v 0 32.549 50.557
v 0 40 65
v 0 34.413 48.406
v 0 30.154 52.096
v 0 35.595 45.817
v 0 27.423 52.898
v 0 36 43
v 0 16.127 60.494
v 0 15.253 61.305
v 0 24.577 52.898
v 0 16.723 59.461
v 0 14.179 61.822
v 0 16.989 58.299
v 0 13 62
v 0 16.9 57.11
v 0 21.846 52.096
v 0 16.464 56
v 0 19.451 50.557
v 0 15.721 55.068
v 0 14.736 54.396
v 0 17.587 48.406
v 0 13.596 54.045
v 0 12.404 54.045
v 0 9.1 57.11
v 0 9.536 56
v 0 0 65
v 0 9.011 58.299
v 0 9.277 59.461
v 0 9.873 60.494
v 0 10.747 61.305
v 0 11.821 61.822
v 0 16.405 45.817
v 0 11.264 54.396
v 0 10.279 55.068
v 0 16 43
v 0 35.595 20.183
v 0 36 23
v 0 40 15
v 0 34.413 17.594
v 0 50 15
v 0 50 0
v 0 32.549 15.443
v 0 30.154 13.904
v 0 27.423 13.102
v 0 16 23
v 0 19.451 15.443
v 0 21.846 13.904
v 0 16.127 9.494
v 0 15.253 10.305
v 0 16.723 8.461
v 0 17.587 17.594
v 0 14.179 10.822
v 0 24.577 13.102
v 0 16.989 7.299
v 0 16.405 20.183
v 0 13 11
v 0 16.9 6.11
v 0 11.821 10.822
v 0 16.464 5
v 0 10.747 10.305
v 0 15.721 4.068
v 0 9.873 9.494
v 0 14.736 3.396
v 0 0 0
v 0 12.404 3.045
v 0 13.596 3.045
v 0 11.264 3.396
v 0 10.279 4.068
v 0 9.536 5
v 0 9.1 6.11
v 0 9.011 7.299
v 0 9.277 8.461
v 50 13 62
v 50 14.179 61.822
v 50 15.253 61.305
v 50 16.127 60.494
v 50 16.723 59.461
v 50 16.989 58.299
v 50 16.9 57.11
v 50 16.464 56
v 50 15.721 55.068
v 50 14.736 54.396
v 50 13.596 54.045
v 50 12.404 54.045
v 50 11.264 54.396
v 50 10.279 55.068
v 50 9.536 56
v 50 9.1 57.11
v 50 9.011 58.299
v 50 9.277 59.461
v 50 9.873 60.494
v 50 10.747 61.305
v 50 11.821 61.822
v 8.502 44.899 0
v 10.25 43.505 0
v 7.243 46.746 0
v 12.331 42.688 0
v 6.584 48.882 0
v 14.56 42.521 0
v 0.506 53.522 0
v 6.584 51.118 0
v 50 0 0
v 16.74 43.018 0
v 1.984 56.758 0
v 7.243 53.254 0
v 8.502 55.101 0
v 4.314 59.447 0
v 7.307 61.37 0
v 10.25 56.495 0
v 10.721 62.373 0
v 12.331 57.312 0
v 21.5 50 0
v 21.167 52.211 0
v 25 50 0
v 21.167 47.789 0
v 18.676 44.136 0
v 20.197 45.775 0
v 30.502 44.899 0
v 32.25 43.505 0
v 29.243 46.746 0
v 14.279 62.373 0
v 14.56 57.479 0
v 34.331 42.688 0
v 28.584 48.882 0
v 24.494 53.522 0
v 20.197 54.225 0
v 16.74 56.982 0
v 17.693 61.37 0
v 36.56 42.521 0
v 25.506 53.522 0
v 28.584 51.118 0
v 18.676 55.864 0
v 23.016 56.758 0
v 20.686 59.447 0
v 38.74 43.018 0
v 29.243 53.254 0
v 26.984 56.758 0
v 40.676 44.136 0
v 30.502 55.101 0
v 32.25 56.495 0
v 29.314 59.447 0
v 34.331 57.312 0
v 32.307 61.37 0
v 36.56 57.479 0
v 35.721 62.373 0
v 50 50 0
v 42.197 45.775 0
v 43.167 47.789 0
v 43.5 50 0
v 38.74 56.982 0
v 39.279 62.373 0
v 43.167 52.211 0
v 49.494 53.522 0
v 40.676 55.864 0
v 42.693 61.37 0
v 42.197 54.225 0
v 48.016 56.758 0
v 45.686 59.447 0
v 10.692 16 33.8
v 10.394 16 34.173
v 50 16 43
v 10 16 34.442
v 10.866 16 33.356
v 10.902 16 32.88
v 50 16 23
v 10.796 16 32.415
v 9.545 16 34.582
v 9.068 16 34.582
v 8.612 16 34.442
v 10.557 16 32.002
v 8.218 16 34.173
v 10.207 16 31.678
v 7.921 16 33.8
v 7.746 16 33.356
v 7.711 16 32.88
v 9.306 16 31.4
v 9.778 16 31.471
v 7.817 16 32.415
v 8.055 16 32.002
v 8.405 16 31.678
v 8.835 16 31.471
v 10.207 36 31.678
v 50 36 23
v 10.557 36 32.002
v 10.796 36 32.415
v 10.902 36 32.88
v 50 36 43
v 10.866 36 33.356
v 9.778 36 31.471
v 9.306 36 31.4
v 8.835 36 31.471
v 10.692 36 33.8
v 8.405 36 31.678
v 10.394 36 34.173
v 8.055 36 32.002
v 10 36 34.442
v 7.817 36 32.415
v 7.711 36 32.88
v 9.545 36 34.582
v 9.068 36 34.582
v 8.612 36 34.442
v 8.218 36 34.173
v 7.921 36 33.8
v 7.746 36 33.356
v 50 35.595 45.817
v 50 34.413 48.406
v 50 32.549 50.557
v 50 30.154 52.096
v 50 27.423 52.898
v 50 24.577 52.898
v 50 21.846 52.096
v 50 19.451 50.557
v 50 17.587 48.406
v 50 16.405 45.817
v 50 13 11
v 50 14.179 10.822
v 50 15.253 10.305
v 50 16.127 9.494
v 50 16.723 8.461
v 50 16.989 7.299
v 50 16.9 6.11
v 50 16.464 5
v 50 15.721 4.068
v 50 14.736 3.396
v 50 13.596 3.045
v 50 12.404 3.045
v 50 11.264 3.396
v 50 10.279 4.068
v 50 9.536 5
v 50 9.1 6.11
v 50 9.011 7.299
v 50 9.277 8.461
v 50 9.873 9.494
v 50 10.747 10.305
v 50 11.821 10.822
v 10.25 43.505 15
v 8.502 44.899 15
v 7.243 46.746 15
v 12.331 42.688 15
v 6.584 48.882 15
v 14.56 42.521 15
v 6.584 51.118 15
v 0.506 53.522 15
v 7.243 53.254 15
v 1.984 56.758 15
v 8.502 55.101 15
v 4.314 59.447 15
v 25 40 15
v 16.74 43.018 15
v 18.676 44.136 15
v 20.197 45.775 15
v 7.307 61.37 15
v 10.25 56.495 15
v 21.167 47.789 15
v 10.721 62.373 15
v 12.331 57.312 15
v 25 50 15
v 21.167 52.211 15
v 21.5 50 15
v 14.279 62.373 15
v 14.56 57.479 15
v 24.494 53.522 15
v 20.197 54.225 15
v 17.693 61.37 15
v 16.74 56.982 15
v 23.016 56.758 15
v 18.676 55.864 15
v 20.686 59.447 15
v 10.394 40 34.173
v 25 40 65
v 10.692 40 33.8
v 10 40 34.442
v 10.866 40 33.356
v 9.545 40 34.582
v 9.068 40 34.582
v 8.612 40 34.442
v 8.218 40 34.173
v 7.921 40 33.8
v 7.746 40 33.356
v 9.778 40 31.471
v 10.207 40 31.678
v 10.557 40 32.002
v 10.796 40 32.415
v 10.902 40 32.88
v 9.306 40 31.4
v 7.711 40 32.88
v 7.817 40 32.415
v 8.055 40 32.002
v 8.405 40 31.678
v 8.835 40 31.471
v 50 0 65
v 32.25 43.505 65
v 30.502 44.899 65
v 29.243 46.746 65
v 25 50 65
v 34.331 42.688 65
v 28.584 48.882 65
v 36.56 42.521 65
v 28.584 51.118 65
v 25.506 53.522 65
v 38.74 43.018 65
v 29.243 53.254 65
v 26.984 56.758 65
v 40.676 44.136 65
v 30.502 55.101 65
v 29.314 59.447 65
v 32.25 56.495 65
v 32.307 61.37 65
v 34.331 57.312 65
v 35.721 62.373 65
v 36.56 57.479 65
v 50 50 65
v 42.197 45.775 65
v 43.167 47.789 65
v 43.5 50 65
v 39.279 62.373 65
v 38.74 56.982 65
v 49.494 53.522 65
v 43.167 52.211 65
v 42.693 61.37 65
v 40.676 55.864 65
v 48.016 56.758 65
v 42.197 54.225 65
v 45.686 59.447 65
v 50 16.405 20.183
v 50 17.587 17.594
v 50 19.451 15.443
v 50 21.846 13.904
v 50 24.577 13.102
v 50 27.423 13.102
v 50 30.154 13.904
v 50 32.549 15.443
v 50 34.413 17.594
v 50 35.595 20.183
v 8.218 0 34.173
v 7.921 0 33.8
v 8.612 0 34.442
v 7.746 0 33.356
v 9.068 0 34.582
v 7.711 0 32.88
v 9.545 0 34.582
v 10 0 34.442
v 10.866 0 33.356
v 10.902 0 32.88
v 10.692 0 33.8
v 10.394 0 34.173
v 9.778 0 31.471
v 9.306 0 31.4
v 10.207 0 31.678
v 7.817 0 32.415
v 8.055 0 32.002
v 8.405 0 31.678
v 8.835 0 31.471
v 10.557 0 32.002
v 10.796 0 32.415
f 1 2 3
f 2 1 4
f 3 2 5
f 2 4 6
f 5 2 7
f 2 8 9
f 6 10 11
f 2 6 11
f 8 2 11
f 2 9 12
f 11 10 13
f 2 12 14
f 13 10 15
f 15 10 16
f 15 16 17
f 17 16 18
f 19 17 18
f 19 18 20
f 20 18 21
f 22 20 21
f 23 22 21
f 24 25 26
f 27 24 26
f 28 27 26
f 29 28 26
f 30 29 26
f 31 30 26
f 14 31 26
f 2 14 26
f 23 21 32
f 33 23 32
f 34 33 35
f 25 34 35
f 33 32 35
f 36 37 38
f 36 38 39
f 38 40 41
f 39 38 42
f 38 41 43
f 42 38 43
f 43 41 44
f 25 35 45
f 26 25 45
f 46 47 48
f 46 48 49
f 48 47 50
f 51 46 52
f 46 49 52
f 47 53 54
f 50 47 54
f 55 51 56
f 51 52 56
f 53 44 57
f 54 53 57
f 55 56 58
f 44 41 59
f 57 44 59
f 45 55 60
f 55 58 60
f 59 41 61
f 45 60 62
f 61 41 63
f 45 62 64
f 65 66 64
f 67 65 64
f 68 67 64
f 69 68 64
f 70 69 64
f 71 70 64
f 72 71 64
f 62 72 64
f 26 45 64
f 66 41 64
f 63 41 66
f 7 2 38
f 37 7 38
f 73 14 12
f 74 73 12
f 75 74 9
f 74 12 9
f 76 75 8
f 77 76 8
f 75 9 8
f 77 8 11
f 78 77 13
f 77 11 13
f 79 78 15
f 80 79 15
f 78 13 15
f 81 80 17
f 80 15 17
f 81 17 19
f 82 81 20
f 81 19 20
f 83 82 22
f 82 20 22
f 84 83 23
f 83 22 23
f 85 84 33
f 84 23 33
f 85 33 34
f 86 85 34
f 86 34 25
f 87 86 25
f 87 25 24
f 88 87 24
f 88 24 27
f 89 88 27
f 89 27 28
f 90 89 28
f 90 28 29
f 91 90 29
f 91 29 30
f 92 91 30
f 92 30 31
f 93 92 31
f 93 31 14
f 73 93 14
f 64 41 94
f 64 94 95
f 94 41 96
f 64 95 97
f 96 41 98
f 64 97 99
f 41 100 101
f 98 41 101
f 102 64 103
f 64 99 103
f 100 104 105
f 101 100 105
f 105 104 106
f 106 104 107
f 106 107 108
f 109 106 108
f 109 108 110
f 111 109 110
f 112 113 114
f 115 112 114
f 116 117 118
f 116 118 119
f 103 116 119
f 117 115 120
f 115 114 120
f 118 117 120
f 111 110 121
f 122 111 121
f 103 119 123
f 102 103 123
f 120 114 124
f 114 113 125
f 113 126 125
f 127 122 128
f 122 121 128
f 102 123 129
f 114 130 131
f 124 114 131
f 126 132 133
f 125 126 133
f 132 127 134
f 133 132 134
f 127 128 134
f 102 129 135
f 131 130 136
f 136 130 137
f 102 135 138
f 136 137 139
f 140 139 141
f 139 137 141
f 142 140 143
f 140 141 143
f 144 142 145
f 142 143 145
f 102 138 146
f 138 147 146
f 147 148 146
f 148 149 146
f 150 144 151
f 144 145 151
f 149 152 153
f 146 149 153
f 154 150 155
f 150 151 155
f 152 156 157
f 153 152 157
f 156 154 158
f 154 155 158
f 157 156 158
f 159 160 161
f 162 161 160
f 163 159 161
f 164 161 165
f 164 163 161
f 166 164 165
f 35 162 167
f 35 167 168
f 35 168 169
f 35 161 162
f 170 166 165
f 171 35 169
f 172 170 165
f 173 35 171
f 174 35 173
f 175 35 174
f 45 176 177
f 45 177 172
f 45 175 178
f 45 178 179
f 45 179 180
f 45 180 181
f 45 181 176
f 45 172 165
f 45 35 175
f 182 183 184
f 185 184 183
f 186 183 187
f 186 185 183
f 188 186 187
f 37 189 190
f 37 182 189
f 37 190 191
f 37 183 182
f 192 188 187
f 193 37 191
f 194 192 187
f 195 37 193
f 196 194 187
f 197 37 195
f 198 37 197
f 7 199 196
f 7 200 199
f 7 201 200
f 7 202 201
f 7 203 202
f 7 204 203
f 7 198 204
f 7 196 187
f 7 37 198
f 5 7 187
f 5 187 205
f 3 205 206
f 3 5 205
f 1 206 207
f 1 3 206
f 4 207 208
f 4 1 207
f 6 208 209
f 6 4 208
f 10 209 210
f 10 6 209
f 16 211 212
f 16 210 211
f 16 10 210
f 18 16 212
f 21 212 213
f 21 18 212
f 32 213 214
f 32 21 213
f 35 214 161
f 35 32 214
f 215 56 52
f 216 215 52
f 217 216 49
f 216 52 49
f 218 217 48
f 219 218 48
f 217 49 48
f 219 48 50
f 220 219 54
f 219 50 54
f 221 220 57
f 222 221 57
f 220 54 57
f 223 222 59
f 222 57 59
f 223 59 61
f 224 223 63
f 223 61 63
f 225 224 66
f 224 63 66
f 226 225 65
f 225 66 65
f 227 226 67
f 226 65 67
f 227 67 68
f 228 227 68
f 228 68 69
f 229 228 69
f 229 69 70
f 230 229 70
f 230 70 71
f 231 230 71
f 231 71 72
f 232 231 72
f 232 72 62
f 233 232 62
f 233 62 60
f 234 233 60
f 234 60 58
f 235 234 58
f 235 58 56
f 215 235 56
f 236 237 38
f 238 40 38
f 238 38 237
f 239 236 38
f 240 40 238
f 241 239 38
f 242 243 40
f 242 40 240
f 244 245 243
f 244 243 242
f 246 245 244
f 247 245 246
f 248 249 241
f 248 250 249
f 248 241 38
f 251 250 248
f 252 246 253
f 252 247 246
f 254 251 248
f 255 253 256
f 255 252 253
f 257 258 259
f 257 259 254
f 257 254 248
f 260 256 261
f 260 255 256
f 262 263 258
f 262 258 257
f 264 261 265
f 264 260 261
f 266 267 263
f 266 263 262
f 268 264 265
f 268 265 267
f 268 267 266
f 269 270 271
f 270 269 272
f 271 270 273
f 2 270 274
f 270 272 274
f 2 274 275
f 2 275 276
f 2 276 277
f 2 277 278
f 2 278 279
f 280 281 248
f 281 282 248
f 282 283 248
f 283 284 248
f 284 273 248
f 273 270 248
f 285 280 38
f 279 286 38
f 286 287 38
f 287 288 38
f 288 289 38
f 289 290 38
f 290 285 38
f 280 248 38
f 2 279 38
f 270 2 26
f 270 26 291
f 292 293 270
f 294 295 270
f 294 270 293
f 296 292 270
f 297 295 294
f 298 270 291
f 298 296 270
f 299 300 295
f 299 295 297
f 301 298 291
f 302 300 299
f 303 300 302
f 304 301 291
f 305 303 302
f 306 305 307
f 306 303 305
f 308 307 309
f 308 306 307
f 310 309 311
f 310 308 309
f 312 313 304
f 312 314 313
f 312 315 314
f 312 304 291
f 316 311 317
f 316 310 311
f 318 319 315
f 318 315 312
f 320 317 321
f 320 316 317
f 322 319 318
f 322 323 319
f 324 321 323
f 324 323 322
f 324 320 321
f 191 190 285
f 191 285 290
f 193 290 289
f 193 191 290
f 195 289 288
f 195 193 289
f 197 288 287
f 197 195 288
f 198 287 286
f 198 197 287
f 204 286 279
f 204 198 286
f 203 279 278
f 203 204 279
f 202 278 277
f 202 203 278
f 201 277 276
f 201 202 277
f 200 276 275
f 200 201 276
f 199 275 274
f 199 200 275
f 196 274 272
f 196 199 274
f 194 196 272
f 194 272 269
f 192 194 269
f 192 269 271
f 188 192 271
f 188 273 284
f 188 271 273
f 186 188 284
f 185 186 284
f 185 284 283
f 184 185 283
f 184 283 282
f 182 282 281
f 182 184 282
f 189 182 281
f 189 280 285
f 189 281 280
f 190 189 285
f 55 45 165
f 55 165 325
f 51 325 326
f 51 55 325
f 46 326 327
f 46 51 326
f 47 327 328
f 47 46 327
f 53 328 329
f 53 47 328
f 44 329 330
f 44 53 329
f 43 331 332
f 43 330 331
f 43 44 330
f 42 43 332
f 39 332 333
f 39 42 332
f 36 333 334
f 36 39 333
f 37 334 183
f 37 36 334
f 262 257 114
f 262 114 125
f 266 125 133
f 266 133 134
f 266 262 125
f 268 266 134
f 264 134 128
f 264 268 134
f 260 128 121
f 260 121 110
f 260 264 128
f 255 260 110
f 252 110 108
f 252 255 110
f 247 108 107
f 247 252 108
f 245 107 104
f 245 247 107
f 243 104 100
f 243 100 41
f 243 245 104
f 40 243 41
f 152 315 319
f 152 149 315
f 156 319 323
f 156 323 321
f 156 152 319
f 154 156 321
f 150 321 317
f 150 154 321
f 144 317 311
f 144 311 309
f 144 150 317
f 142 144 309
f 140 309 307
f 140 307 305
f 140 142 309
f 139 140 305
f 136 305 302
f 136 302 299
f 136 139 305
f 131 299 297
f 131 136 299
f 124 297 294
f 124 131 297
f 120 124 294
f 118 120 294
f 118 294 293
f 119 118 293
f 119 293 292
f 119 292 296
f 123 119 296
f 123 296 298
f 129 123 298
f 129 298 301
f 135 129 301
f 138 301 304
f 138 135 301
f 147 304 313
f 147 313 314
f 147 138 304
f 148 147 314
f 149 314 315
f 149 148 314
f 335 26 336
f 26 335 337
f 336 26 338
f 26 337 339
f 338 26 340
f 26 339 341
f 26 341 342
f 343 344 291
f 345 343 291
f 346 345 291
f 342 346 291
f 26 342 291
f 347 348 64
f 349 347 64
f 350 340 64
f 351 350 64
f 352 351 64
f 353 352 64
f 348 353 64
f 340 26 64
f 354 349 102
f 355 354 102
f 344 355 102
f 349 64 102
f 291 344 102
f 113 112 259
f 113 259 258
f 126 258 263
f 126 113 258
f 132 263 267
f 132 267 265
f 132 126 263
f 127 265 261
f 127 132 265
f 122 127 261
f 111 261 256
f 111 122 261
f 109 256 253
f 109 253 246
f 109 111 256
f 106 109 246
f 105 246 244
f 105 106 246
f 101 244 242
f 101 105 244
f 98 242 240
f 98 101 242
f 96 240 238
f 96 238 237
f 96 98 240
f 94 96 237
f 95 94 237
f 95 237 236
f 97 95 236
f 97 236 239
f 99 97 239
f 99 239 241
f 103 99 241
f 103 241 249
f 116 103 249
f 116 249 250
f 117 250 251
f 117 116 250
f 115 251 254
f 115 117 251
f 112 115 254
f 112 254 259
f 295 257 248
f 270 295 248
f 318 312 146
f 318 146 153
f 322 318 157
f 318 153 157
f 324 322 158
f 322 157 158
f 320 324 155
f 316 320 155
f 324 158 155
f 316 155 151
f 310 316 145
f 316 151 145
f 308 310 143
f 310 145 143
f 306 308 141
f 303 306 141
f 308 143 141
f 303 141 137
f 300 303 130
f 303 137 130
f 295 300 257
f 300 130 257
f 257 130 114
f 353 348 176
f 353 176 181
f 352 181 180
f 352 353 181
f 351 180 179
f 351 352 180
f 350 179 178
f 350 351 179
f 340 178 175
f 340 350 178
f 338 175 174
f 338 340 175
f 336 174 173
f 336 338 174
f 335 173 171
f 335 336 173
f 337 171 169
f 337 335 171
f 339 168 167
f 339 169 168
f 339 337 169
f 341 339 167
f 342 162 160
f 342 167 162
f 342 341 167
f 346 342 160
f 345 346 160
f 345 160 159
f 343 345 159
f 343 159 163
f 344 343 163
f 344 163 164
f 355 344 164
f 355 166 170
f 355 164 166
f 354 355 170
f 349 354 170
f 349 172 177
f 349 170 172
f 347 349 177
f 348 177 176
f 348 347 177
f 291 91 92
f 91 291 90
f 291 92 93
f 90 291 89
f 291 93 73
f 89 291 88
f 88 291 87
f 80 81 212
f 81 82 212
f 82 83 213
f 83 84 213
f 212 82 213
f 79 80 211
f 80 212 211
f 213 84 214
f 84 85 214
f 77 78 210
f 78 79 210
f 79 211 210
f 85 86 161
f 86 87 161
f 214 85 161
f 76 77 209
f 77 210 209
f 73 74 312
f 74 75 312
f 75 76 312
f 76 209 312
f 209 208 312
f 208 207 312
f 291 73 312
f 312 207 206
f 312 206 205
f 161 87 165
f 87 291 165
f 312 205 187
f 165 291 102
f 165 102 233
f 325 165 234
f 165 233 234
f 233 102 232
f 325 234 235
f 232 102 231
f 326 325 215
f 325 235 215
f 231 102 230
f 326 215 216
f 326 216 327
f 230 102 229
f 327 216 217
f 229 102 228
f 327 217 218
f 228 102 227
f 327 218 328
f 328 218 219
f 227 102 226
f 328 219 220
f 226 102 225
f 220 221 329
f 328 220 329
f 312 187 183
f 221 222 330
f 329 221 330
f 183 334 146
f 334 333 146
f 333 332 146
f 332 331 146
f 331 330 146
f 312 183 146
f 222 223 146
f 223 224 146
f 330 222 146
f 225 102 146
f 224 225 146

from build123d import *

# Parameters (mm, degrees)
SKETCH1_R               = 7.5
BOSS_EXTRUDE1_DEPTH     = 15
SKETCH2_R               = 7.5
BOSS_EXTRUDE2_DEPTH     = 50
SKETCH3_W               = 50
SKETCH3_H               = 40
BOSS_EXTRUDE3_DEPTH     = 65
CUT_EXTRUDE1_DEPTH      = 105.024035684
CUT_EXTRUDE2_DEPTH      = 96.372952141
SKETCH9_R               = 4
CUT_EXTRUDE3_DEPTH      = 104.107953137
CUT_EXTRUDE4_DEPTH      = 95.272212237
CUT_EXTRUDE4_DEPTH_BACK = 95.272212237
SKETCH10_R              = 1.6


with BuildPart() as part:
    # Sketch1 → Boss-Extrude1 (new body)
    with BuildSketch(Plane.XY):
        with BuildLine():
            Line((0, 0), (50, 0))
            Line((50, 0), (50, 50))
            ThreePointArc((50, 50), (40.582575695, 63.228756555), (25, 58.660254038))
            ThreePointArc((25, 58.660254038), (9.417424305, 63.228756555), (0, 50))
            Line((0, 50), (0, 0))
        make_face()
        with Locations((36, 50)):
            Circle(SKETCH1_R, mode=Mode.SUBTRACT)
        with Locations((14, 50)):
            Circle(SKETCH1_R, mode=Mode.SUBTRACT)
    extrude(amount=BOSS_EXTRUDE1_DEPTH)

    # Sketch2 → Boss-Extrude2 (add)
    with BuildSketch(Plane.XY.offset(15)):
        with BuildLine():
            Line((25, 50), (25, 0))
            Line((25, 0), (50, 0))
            Line((50, 0), (50, 50))
            ThreePointArc((50, 50), (37.5, 62.5), (25, 50))
        make_face()
        with Locations((36, 50)):
            Circle(SKETCH2_R, mode=Mode.SUBTRACT)
    extrude(amount=BOSS_EXTRUDE2_DEPTH)

    # Sketch3 → Boss-Extrude3 (add)
    with BuildSketch(Plane(origin=(0, 0, 0), x_dir=(-1, 0, 0), z_dir=(0, 0, -1))):
        with Locations((-25, 20)):
            Rectangle(SKETCH3_W, SKETCH3_H)
    extrude(amount=-BOSS_EXTRUDE3_DEPTH)

    # Sketch4 → Cut-Extrude1 (cut, through all)
    with BuildSketch(Plane.ZY):
        with BuildLine():
            Line((23, 36), (43, 36))
            ThreePointArc((43, 36), (53, 26), (43, 16))
            Line((43, 16), (23, 16))
            ThreePointArc((23, 16), (13, 26), (23, 36))
        make_face()
    extrude(amount=-CUT_EXTRUDE1_DEPTH, mode=Mode.SUBTRACT)

    # Sketch2<3> → Cut-Extrude2 (cut, through all)
    with BuildSketch(Plane.XY.offset(15)):
        with BuildLine():
            ThreePointArc((25, 58.660254038), (9.417424305, 63.228756555), (0, 50))
            ThreePointArc((0, 50), (12.5, 62.5), (25, 50))
            ThreePointArc((25, 50), (37.5, 62.5), (50, 50))
            ThreePointArc((50, 50), (40.582575695, 63.228756555), (25, 58.660254038))
        make_face()
    extrude(amount=-CUT_EXTRUDE2_DEPTH, mode=Mode.SUBTRACT)

    # Sketch9 → Cut-Extrude3 (cut, through all)
    with BuildSketch(Plane.ZY):
        with Locations((7, 13)):
            Circle(SKETCH9_R)
        with Locations((58, 13)):
            Circle(SKETCH9_R)
    extrude(amount=-CUT_EXTRUDE3_DEPTH, mode=Mode.SUBTRACT)

    # Sketch10 → Cut-Extrude4 (cut, two sides: drawn at the far end of the back side and taken through both)
    with BuildSketch(Plane(origin=(0, 16, 0), x_dir=(1, 0, 0), z_dir=(0, 1, 0)).offset(-CUT_EXTRUDE4_DEPTH_BACK)):
        with Locations((9.306144925, -33)):
            Circle(SKETCH10_R)
    extrude(amount=CUT_EXTRUDE4_DEPTH + CUT_EXTRUDE4_DEPTH_BACK, mode=Mode.SUBTRACT)


solid = part.part
